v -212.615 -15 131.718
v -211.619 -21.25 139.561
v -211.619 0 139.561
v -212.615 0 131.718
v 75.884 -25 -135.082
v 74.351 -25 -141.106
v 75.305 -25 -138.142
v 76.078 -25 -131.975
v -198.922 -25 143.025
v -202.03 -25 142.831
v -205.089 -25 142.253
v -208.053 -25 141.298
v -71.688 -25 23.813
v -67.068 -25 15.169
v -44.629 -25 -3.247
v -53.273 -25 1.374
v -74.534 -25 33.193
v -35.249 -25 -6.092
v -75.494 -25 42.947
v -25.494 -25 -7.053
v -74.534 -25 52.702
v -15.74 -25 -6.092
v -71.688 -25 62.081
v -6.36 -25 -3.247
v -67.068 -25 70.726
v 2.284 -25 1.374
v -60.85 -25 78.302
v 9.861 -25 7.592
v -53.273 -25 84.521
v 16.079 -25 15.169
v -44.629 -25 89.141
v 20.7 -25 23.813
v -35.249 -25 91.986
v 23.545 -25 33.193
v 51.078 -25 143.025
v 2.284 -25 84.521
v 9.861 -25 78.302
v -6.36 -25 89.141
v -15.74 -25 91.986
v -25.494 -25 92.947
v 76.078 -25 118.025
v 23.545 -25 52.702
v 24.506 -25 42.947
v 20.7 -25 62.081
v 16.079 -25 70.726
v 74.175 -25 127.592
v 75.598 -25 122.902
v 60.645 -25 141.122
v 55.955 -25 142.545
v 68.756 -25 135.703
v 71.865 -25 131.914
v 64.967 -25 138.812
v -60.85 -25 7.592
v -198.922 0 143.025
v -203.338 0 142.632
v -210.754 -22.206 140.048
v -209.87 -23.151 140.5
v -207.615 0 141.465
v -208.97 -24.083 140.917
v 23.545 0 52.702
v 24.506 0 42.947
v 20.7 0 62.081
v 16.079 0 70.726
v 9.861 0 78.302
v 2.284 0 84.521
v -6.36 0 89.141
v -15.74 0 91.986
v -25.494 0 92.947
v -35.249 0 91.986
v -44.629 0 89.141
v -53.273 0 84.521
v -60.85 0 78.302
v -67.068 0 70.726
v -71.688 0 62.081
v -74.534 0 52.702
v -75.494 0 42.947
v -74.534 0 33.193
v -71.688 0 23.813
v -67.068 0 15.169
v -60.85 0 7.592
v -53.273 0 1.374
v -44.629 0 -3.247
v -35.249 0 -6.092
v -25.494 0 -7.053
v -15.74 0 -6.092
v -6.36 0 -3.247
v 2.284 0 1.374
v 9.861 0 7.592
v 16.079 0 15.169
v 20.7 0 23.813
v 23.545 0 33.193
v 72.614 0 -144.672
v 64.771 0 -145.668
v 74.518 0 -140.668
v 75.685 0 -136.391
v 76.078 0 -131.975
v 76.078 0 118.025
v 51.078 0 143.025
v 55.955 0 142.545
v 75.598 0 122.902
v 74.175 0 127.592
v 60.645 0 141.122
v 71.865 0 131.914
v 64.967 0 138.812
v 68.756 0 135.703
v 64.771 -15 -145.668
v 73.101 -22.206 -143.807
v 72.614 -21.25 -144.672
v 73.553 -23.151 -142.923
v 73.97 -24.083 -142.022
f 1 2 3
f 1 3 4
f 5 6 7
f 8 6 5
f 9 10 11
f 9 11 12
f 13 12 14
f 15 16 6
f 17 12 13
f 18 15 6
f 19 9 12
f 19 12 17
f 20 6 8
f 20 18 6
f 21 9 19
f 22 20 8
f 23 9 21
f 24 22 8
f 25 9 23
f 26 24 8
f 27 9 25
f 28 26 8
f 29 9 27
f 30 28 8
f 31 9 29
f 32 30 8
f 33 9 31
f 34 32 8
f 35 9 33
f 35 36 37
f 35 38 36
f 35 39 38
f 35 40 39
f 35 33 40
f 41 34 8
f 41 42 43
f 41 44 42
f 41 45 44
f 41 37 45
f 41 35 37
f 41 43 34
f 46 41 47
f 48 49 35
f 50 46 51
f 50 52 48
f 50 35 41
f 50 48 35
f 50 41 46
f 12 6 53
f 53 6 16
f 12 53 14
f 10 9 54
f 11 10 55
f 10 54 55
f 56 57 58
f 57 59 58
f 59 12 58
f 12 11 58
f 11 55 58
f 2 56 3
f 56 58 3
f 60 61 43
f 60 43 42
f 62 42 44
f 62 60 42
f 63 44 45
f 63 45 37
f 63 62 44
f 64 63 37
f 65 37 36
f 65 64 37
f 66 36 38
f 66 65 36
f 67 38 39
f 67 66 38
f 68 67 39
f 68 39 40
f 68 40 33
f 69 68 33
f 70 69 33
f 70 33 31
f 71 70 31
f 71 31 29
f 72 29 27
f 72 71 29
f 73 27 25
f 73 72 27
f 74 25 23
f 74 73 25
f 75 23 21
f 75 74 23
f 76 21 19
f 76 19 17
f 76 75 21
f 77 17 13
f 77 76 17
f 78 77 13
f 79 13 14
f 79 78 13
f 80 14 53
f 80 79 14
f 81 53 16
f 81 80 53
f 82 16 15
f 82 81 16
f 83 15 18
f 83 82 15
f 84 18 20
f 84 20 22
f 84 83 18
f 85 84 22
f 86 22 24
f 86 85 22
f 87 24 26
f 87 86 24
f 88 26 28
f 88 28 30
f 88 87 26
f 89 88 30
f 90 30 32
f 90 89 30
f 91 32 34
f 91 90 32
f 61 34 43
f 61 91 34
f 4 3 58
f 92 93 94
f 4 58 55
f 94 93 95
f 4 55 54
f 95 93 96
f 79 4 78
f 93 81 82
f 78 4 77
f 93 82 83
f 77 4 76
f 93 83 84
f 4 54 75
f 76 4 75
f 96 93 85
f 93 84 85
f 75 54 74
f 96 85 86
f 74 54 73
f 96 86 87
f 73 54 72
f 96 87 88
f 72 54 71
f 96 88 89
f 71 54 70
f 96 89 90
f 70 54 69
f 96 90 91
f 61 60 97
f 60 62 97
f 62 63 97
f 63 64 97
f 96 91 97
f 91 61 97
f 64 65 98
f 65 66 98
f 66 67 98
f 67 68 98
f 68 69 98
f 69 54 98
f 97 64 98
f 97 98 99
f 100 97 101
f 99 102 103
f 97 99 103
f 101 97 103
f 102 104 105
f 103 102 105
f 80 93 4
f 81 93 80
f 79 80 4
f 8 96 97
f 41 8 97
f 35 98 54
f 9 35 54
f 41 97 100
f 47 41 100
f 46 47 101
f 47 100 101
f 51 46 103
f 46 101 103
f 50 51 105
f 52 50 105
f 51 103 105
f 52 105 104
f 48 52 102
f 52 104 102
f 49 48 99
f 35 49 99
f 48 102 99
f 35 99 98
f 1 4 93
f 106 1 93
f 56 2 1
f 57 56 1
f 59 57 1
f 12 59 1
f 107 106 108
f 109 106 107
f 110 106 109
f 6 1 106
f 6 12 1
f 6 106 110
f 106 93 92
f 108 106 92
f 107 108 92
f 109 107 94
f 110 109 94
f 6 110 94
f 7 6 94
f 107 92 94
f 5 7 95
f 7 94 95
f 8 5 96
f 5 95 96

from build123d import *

# Parameters (mm, degrees)
F0_R        = 50
F1_DEPTH    = 25
F2_SIZE     = 10
F3_T1_DEPTH = 47.2159409701


# Not quite as in the source:
# - a fillet or chamfer that OpenCascade refuses, or shapes differently, is made with other operations: its cross-section is extruded or revolved along the edge and cut away or added


with BuildPart() as f1:
    # F0 (on Front) → F1 (new body)
    with BuildSketch(Plane.XZ):
        with BuildLine():
            Line((51.0779787002, 143.0251310061), (-198.9220212998, 143.0251310061))
            ThreePointArc((-198.9220212998, 143.0251310061), (-208.4891071089, 141.1221193189), (-216.5996908295, 135.7028005358))
            Line((-216.5996908295, 135.7028005358), (68.7556482299, -149.6525385235))
            ThreePointArc((68.7556482299, -149.6525385235), (74.174967013, -141.541954803), (76.0779787002, -131.9748689939))
            Line((76.0779787002, -131.9748689939), (76.0779787002, 118.0251310061))
            ThreePointArc((76.0779787002, 118.0251310061), (68.7556482299, 135.7028005358), (51.0779787002, 143.0251310061))
        make_face()
        with Locations((-25.4944633545, 42.9471413087)):
            Circle(F0_R, mode=Mode.SUBTRACT)
    extrude(amount=F1_DEPTH)

    # F2
    f2_edges = [f1.edges().sort_by_distance(p)[0] for p in [
        (-73.922021, -25, -6.974869),
    ]]
    chamfer(f2_edges, length=F2_SIZE)

    # F3: chamfer of 5 on 2 edges, made by hand

    # F3_s2 → F3_t1 (cut)
    with BuildSketch(Plane.XZ.offset(-16.1079704851)):
        with BuildLine():
            Line((64.7710426378, -145.6679329315), (72.6137260047, -144.6717815335))
            ThreePointArc((72.6137260047, -144.6717815335), (70.8856590953, -147.2279276171), (68.7556482299, -149.6525385235))
            Line((68.7556482299, -149.6525385235), (64.7710426378, -145.6679329315))
        make_face()
        with BuildLine():
            Line((-211.6189338394, 139.5608783106), (-212.6150852374, 131.7181949438))
            Line((-212.6150852374, 131.7181949438), (-216.5996908295, 135.7028005358))
            ThreePointArc((-216.5996908295, 135.7028005358), (-214.1750799231, 137.8328114012), (-211.6189338394, 139.5608783106))
        make_face()
    extrude(amount=F3_T1_DEPTH, mode=Mode.SUBTRACT)


solid = f1.part
